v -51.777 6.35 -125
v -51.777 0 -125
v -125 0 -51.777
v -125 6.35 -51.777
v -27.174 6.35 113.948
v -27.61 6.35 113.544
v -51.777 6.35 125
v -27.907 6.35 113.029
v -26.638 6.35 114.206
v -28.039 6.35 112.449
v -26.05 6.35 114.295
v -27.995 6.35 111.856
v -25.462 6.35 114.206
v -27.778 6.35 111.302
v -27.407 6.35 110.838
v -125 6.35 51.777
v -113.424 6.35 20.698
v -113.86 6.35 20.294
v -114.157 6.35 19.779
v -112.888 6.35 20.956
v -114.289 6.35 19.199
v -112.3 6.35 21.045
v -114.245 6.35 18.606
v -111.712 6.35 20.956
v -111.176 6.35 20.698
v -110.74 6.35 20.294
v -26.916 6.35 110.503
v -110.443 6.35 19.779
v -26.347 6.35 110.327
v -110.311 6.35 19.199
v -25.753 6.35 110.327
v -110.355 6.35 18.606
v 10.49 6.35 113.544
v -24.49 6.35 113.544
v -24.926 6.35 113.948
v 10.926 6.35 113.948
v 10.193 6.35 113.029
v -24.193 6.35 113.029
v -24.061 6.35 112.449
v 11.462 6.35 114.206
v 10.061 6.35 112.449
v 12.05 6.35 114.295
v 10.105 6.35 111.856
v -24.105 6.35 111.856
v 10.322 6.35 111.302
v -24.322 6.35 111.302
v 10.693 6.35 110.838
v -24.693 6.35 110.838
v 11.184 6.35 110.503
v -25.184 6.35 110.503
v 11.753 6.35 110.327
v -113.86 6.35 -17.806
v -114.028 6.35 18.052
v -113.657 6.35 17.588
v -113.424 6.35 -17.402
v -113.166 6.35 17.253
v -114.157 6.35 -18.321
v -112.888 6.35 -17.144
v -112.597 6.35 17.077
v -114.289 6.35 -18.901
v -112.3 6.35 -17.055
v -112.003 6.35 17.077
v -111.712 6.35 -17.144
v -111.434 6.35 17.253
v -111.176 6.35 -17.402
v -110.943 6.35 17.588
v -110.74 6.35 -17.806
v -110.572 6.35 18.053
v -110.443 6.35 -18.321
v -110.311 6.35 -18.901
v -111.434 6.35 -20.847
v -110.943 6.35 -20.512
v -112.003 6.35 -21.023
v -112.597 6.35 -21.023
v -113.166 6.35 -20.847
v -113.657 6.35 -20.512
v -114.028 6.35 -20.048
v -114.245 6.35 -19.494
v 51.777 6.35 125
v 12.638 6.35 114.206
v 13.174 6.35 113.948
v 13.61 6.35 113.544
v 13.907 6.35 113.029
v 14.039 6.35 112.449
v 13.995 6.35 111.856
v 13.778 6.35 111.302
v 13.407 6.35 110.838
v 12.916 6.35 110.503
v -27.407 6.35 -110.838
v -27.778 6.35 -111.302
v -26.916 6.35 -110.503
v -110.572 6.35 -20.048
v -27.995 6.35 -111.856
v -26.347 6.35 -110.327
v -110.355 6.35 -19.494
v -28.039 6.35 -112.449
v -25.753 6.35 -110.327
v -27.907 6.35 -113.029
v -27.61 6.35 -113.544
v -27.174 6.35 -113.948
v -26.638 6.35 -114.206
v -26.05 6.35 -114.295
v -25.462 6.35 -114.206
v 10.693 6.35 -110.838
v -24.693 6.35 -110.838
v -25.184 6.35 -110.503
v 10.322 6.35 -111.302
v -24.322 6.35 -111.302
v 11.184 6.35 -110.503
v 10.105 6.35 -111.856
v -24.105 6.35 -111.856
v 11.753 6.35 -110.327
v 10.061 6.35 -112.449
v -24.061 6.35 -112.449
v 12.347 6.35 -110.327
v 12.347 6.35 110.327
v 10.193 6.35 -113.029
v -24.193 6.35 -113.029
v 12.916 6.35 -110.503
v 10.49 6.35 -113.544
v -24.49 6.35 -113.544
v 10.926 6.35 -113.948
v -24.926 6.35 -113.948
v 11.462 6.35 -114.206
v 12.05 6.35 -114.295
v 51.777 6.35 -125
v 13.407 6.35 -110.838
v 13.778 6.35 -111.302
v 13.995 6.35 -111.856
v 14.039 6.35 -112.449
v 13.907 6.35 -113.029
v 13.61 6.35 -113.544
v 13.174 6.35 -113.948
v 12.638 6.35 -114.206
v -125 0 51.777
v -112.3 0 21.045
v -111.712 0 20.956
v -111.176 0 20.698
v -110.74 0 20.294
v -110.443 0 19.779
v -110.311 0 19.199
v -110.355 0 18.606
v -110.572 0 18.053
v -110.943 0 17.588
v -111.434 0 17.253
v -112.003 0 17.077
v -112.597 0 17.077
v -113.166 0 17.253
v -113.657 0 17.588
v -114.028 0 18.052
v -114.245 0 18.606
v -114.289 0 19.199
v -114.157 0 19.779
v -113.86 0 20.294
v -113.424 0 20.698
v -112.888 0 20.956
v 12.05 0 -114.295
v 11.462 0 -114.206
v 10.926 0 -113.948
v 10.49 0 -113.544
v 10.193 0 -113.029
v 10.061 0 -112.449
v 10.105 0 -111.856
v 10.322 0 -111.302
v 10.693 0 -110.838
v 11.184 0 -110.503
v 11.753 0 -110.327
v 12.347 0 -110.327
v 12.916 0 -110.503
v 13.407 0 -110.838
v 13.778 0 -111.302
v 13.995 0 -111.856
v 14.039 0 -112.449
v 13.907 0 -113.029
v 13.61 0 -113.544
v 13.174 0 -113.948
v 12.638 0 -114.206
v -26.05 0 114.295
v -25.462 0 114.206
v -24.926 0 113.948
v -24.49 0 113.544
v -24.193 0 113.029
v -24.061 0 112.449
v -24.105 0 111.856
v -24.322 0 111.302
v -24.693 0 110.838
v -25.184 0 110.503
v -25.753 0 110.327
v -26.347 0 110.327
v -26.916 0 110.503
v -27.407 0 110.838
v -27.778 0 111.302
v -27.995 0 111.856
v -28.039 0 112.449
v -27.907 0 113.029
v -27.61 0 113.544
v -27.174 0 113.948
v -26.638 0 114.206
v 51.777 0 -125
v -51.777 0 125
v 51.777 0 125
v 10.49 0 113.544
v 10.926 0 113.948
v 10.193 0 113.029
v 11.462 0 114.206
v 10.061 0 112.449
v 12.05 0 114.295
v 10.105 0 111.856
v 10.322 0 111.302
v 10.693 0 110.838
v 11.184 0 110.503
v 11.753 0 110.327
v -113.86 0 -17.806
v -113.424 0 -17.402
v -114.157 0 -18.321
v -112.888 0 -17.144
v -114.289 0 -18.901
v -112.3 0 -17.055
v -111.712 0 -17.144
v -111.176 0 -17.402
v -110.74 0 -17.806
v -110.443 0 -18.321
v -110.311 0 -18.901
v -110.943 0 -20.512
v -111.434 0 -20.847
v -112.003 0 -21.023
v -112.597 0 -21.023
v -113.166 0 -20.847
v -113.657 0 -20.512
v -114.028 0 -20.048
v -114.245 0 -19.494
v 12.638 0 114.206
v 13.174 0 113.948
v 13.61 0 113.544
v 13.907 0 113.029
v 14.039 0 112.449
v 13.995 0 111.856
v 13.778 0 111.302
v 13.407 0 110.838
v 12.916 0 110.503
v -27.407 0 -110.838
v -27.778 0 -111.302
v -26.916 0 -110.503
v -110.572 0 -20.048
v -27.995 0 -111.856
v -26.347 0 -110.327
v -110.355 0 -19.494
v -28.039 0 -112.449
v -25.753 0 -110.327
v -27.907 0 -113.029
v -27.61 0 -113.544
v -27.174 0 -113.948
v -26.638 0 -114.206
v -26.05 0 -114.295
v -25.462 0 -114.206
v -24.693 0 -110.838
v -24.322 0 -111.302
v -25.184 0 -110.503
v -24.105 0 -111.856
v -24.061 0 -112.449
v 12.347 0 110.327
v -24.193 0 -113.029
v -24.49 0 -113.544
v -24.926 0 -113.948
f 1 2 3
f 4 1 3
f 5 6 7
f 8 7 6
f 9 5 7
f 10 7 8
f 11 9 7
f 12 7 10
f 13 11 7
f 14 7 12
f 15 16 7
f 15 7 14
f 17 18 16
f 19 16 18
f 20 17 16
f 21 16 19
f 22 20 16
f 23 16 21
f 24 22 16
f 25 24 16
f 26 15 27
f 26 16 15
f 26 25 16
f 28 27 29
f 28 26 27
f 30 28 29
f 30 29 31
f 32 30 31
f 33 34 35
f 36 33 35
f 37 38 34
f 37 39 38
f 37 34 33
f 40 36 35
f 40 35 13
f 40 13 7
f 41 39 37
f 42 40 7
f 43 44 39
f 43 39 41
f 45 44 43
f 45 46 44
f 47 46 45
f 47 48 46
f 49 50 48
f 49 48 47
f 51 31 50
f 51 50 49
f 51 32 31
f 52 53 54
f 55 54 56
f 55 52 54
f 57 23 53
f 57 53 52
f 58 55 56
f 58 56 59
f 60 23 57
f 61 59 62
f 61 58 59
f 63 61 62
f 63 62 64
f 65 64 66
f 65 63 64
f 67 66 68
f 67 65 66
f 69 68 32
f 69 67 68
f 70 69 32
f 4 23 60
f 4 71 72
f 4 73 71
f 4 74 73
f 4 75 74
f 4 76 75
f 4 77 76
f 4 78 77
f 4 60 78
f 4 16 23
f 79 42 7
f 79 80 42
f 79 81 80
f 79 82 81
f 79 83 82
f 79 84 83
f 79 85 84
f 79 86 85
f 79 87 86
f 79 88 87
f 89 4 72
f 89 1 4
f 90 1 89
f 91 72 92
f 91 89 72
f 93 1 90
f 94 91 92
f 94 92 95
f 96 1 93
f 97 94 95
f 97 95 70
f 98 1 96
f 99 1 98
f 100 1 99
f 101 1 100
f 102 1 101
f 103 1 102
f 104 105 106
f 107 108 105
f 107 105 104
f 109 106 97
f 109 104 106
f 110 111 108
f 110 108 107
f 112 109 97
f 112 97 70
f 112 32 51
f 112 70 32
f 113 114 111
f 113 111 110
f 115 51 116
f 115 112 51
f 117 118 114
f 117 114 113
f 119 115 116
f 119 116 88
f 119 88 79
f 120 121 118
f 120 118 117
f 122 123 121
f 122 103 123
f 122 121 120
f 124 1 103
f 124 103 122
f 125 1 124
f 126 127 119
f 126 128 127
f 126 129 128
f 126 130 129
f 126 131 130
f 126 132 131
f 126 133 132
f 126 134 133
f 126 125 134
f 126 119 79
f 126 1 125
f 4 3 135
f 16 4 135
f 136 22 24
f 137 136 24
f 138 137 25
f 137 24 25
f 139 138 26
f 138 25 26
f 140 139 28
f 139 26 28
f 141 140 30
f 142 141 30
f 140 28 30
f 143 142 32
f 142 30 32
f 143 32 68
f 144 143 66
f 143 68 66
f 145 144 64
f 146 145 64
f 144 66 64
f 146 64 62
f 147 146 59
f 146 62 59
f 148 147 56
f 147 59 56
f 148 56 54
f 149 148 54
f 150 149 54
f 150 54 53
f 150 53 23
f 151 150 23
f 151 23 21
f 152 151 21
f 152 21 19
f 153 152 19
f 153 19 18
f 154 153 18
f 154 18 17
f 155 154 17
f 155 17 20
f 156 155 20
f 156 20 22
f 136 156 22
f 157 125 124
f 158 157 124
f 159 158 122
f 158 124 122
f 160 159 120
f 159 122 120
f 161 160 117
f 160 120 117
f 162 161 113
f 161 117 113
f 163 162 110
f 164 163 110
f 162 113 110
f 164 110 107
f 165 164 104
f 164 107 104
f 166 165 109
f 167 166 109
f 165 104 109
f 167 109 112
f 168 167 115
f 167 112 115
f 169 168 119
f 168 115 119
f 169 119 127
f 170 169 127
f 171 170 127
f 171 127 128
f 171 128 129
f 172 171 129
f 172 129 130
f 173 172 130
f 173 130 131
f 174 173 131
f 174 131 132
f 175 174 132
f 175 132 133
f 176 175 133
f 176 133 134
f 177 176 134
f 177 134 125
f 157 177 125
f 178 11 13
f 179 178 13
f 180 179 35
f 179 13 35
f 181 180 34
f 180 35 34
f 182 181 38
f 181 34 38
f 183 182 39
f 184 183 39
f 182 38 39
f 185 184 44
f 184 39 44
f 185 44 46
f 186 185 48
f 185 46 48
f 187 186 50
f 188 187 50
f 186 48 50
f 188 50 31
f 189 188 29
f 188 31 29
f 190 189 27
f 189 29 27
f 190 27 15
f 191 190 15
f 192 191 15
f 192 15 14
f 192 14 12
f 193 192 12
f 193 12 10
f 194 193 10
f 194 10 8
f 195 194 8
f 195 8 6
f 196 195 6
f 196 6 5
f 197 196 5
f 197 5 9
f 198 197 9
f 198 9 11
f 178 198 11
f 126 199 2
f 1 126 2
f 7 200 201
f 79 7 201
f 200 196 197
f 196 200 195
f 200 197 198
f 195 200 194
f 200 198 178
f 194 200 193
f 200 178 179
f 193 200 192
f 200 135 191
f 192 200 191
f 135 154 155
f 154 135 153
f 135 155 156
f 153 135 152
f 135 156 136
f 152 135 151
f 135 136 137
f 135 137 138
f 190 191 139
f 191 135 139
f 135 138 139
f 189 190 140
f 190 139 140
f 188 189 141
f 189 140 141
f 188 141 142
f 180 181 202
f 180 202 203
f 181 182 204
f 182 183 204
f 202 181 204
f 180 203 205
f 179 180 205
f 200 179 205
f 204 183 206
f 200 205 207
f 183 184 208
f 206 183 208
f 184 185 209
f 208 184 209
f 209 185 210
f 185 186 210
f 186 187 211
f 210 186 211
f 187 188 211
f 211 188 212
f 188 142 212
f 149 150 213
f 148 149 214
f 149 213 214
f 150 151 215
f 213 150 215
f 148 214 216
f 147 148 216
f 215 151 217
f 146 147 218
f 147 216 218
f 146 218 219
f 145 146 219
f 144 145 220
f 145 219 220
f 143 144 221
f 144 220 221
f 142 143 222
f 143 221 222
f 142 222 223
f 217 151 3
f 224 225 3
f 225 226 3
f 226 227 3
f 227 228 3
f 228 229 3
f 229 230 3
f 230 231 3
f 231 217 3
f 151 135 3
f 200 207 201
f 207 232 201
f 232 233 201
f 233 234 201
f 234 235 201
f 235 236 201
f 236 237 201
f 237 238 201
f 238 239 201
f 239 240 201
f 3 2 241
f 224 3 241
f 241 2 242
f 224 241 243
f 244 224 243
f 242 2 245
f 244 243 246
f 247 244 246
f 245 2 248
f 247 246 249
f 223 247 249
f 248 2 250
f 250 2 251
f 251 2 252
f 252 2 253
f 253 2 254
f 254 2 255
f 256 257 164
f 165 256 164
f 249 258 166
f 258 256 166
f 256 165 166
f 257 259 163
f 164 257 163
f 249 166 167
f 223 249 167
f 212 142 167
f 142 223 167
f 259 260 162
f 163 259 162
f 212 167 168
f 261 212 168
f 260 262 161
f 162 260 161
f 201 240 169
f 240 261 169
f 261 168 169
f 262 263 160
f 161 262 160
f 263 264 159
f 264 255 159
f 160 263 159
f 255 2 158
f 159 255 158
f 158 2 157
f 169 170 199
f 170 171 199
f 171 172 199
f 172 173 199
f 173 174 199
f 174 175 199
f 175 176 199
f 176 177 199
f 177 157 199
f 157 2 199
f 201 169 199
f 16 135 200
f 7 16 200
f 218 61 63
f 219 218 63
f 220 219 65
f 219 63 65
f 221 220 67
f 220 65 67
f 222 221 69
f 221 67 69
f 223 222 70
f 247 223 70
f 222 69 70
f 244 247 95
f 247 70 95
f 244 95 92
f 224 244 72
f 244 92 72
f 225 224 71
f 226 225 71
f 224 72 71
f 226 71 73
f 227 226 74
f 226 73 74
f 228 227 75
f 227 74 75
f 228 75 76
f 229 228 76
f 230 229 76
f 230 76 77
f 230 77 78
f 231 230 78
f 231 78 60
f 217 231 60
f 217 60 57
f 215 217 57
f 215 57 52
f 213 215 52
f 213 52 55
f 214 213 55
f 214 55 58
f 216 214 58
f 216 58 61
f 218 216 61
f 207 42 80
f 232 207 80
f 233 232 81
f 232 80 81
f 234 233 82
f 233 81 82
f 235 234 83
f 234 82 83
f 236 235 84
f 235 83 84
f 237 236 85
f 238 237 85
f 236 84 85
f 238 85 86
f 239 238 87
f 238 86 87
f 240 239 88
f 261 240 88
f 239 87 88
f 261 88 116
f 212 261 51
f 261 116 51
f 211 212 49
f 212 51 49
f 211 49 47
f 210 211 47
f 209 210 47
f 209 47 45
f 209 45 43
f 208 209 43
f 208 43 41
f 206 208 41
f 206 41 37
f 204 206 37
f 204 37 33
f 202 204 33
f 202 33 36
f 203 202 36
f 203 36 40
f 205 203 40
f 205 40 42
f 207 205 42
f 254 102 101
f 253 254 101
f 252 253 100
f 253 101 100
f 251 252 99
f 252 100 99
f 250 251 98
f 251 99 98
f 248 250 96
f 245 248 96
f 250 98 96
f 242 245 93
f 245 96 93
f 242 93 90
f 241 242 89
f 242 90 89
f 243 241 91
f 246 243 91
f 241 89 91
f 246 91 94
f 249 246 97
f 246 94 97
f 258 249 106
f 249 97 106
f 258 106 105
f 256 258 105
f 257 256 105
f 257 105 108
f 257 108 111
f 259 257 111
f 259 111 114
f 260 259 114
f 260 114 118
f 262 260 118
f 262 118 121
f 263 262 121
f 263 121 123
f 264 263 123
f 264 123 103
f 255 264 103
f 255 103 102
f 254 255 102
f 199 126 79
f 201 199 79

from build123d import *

# Parameters (mm, degrees)
BOSS_EXTRUDE1_DEPTH = 6.35
SKETCH2_R           = 1.995
CUT_EXTRUDE1_DEPTH  = 177.890707783
SKETCH5_R           = 1.995
CUT_EXTRUDE5_DEPTH  = 177.890707783
CUT_EXTRUDE6_DEPTH  = 10


with BuildPart() as part:
    # Sketch1 → Boss-Extrude1 (new body)
    with BuildSketch(Plane(origin=(0, 0, 0), x_dir=(1, 0, 0), z_dir=(0, 1, 0))):
        Polygon((125, 51.776695297), (51.776695297, 125), (-51.776695297, 125), (-125, 51.776695297), (-125, -51.776695297), (-51.776695297, -125), (51.776695297, -125), (125, -51.776695297), align=None)
    extrude(amount=BOSS_EXTRUDE1_DEPTH)

    # Sketch2 → Cut-Extrude1 (cut, through all)
    with BuildSketch(Plane(origin=(0, 6.35, 0), x_dir=(1, 0, 0), z_dir=(0, 1, 0))):
        with Locations(Location((-26.05, -112.3, 0), (0, 0, 270))):
            Circle(SKETCH2_R)
        with Locations(Location((12.05, -112.3, 0), (0, 0, 270))):
            Circle(SKETCH2_R)
        with Locations(Location((12.05, 112.3, 0), (0, 0, 90))):
            Circle(SKETCH2_R)
        with Locations(Location((-26.05, 112.3, 0), (0, 0, 90))):
            Circle(SKETCH2_R)
    extrude(amount=-CUT_EXTRUDE1_DEPTH, mode=Mode.SUBTRACT)

    # Sketch5 → Cut-Extrude5 (cut, through all)
    with BuildSketch(Plane(origin=(0, 6.35, 0), x_dir=(1, 0, 0), z_dir=(0, 1, 0))):
        with Locations(Location((-112.3, 19.05, 0), (0, 0, 270))):
            Circle(SKETCH5_R)
        with Locations(Location((-112.3, -19.05, 0), (0, 0, 270))):
            Circle(SKETCH5_R)
    extrude(amount=-CUT_EXTRUDE5_DEPTH, mode=Mode.SUBTRACT)

    # Sketch6 → Cut-Extrude6 (cut)
    with BuildSketch(Plane(origin=(0, 6.35, 0), x_dir=(1, 0, 0), z_dir=(0, 1, 0))):
        Polygon((51.776695297, -125), (125, -51.776695297), (125, 51.776695297), (51.776695297, 125), align=None)
    extrude(amount=-CUT_EXTRUDE6_DEPTH, mode=Mode.SUBTRACT)


solid = part.part
